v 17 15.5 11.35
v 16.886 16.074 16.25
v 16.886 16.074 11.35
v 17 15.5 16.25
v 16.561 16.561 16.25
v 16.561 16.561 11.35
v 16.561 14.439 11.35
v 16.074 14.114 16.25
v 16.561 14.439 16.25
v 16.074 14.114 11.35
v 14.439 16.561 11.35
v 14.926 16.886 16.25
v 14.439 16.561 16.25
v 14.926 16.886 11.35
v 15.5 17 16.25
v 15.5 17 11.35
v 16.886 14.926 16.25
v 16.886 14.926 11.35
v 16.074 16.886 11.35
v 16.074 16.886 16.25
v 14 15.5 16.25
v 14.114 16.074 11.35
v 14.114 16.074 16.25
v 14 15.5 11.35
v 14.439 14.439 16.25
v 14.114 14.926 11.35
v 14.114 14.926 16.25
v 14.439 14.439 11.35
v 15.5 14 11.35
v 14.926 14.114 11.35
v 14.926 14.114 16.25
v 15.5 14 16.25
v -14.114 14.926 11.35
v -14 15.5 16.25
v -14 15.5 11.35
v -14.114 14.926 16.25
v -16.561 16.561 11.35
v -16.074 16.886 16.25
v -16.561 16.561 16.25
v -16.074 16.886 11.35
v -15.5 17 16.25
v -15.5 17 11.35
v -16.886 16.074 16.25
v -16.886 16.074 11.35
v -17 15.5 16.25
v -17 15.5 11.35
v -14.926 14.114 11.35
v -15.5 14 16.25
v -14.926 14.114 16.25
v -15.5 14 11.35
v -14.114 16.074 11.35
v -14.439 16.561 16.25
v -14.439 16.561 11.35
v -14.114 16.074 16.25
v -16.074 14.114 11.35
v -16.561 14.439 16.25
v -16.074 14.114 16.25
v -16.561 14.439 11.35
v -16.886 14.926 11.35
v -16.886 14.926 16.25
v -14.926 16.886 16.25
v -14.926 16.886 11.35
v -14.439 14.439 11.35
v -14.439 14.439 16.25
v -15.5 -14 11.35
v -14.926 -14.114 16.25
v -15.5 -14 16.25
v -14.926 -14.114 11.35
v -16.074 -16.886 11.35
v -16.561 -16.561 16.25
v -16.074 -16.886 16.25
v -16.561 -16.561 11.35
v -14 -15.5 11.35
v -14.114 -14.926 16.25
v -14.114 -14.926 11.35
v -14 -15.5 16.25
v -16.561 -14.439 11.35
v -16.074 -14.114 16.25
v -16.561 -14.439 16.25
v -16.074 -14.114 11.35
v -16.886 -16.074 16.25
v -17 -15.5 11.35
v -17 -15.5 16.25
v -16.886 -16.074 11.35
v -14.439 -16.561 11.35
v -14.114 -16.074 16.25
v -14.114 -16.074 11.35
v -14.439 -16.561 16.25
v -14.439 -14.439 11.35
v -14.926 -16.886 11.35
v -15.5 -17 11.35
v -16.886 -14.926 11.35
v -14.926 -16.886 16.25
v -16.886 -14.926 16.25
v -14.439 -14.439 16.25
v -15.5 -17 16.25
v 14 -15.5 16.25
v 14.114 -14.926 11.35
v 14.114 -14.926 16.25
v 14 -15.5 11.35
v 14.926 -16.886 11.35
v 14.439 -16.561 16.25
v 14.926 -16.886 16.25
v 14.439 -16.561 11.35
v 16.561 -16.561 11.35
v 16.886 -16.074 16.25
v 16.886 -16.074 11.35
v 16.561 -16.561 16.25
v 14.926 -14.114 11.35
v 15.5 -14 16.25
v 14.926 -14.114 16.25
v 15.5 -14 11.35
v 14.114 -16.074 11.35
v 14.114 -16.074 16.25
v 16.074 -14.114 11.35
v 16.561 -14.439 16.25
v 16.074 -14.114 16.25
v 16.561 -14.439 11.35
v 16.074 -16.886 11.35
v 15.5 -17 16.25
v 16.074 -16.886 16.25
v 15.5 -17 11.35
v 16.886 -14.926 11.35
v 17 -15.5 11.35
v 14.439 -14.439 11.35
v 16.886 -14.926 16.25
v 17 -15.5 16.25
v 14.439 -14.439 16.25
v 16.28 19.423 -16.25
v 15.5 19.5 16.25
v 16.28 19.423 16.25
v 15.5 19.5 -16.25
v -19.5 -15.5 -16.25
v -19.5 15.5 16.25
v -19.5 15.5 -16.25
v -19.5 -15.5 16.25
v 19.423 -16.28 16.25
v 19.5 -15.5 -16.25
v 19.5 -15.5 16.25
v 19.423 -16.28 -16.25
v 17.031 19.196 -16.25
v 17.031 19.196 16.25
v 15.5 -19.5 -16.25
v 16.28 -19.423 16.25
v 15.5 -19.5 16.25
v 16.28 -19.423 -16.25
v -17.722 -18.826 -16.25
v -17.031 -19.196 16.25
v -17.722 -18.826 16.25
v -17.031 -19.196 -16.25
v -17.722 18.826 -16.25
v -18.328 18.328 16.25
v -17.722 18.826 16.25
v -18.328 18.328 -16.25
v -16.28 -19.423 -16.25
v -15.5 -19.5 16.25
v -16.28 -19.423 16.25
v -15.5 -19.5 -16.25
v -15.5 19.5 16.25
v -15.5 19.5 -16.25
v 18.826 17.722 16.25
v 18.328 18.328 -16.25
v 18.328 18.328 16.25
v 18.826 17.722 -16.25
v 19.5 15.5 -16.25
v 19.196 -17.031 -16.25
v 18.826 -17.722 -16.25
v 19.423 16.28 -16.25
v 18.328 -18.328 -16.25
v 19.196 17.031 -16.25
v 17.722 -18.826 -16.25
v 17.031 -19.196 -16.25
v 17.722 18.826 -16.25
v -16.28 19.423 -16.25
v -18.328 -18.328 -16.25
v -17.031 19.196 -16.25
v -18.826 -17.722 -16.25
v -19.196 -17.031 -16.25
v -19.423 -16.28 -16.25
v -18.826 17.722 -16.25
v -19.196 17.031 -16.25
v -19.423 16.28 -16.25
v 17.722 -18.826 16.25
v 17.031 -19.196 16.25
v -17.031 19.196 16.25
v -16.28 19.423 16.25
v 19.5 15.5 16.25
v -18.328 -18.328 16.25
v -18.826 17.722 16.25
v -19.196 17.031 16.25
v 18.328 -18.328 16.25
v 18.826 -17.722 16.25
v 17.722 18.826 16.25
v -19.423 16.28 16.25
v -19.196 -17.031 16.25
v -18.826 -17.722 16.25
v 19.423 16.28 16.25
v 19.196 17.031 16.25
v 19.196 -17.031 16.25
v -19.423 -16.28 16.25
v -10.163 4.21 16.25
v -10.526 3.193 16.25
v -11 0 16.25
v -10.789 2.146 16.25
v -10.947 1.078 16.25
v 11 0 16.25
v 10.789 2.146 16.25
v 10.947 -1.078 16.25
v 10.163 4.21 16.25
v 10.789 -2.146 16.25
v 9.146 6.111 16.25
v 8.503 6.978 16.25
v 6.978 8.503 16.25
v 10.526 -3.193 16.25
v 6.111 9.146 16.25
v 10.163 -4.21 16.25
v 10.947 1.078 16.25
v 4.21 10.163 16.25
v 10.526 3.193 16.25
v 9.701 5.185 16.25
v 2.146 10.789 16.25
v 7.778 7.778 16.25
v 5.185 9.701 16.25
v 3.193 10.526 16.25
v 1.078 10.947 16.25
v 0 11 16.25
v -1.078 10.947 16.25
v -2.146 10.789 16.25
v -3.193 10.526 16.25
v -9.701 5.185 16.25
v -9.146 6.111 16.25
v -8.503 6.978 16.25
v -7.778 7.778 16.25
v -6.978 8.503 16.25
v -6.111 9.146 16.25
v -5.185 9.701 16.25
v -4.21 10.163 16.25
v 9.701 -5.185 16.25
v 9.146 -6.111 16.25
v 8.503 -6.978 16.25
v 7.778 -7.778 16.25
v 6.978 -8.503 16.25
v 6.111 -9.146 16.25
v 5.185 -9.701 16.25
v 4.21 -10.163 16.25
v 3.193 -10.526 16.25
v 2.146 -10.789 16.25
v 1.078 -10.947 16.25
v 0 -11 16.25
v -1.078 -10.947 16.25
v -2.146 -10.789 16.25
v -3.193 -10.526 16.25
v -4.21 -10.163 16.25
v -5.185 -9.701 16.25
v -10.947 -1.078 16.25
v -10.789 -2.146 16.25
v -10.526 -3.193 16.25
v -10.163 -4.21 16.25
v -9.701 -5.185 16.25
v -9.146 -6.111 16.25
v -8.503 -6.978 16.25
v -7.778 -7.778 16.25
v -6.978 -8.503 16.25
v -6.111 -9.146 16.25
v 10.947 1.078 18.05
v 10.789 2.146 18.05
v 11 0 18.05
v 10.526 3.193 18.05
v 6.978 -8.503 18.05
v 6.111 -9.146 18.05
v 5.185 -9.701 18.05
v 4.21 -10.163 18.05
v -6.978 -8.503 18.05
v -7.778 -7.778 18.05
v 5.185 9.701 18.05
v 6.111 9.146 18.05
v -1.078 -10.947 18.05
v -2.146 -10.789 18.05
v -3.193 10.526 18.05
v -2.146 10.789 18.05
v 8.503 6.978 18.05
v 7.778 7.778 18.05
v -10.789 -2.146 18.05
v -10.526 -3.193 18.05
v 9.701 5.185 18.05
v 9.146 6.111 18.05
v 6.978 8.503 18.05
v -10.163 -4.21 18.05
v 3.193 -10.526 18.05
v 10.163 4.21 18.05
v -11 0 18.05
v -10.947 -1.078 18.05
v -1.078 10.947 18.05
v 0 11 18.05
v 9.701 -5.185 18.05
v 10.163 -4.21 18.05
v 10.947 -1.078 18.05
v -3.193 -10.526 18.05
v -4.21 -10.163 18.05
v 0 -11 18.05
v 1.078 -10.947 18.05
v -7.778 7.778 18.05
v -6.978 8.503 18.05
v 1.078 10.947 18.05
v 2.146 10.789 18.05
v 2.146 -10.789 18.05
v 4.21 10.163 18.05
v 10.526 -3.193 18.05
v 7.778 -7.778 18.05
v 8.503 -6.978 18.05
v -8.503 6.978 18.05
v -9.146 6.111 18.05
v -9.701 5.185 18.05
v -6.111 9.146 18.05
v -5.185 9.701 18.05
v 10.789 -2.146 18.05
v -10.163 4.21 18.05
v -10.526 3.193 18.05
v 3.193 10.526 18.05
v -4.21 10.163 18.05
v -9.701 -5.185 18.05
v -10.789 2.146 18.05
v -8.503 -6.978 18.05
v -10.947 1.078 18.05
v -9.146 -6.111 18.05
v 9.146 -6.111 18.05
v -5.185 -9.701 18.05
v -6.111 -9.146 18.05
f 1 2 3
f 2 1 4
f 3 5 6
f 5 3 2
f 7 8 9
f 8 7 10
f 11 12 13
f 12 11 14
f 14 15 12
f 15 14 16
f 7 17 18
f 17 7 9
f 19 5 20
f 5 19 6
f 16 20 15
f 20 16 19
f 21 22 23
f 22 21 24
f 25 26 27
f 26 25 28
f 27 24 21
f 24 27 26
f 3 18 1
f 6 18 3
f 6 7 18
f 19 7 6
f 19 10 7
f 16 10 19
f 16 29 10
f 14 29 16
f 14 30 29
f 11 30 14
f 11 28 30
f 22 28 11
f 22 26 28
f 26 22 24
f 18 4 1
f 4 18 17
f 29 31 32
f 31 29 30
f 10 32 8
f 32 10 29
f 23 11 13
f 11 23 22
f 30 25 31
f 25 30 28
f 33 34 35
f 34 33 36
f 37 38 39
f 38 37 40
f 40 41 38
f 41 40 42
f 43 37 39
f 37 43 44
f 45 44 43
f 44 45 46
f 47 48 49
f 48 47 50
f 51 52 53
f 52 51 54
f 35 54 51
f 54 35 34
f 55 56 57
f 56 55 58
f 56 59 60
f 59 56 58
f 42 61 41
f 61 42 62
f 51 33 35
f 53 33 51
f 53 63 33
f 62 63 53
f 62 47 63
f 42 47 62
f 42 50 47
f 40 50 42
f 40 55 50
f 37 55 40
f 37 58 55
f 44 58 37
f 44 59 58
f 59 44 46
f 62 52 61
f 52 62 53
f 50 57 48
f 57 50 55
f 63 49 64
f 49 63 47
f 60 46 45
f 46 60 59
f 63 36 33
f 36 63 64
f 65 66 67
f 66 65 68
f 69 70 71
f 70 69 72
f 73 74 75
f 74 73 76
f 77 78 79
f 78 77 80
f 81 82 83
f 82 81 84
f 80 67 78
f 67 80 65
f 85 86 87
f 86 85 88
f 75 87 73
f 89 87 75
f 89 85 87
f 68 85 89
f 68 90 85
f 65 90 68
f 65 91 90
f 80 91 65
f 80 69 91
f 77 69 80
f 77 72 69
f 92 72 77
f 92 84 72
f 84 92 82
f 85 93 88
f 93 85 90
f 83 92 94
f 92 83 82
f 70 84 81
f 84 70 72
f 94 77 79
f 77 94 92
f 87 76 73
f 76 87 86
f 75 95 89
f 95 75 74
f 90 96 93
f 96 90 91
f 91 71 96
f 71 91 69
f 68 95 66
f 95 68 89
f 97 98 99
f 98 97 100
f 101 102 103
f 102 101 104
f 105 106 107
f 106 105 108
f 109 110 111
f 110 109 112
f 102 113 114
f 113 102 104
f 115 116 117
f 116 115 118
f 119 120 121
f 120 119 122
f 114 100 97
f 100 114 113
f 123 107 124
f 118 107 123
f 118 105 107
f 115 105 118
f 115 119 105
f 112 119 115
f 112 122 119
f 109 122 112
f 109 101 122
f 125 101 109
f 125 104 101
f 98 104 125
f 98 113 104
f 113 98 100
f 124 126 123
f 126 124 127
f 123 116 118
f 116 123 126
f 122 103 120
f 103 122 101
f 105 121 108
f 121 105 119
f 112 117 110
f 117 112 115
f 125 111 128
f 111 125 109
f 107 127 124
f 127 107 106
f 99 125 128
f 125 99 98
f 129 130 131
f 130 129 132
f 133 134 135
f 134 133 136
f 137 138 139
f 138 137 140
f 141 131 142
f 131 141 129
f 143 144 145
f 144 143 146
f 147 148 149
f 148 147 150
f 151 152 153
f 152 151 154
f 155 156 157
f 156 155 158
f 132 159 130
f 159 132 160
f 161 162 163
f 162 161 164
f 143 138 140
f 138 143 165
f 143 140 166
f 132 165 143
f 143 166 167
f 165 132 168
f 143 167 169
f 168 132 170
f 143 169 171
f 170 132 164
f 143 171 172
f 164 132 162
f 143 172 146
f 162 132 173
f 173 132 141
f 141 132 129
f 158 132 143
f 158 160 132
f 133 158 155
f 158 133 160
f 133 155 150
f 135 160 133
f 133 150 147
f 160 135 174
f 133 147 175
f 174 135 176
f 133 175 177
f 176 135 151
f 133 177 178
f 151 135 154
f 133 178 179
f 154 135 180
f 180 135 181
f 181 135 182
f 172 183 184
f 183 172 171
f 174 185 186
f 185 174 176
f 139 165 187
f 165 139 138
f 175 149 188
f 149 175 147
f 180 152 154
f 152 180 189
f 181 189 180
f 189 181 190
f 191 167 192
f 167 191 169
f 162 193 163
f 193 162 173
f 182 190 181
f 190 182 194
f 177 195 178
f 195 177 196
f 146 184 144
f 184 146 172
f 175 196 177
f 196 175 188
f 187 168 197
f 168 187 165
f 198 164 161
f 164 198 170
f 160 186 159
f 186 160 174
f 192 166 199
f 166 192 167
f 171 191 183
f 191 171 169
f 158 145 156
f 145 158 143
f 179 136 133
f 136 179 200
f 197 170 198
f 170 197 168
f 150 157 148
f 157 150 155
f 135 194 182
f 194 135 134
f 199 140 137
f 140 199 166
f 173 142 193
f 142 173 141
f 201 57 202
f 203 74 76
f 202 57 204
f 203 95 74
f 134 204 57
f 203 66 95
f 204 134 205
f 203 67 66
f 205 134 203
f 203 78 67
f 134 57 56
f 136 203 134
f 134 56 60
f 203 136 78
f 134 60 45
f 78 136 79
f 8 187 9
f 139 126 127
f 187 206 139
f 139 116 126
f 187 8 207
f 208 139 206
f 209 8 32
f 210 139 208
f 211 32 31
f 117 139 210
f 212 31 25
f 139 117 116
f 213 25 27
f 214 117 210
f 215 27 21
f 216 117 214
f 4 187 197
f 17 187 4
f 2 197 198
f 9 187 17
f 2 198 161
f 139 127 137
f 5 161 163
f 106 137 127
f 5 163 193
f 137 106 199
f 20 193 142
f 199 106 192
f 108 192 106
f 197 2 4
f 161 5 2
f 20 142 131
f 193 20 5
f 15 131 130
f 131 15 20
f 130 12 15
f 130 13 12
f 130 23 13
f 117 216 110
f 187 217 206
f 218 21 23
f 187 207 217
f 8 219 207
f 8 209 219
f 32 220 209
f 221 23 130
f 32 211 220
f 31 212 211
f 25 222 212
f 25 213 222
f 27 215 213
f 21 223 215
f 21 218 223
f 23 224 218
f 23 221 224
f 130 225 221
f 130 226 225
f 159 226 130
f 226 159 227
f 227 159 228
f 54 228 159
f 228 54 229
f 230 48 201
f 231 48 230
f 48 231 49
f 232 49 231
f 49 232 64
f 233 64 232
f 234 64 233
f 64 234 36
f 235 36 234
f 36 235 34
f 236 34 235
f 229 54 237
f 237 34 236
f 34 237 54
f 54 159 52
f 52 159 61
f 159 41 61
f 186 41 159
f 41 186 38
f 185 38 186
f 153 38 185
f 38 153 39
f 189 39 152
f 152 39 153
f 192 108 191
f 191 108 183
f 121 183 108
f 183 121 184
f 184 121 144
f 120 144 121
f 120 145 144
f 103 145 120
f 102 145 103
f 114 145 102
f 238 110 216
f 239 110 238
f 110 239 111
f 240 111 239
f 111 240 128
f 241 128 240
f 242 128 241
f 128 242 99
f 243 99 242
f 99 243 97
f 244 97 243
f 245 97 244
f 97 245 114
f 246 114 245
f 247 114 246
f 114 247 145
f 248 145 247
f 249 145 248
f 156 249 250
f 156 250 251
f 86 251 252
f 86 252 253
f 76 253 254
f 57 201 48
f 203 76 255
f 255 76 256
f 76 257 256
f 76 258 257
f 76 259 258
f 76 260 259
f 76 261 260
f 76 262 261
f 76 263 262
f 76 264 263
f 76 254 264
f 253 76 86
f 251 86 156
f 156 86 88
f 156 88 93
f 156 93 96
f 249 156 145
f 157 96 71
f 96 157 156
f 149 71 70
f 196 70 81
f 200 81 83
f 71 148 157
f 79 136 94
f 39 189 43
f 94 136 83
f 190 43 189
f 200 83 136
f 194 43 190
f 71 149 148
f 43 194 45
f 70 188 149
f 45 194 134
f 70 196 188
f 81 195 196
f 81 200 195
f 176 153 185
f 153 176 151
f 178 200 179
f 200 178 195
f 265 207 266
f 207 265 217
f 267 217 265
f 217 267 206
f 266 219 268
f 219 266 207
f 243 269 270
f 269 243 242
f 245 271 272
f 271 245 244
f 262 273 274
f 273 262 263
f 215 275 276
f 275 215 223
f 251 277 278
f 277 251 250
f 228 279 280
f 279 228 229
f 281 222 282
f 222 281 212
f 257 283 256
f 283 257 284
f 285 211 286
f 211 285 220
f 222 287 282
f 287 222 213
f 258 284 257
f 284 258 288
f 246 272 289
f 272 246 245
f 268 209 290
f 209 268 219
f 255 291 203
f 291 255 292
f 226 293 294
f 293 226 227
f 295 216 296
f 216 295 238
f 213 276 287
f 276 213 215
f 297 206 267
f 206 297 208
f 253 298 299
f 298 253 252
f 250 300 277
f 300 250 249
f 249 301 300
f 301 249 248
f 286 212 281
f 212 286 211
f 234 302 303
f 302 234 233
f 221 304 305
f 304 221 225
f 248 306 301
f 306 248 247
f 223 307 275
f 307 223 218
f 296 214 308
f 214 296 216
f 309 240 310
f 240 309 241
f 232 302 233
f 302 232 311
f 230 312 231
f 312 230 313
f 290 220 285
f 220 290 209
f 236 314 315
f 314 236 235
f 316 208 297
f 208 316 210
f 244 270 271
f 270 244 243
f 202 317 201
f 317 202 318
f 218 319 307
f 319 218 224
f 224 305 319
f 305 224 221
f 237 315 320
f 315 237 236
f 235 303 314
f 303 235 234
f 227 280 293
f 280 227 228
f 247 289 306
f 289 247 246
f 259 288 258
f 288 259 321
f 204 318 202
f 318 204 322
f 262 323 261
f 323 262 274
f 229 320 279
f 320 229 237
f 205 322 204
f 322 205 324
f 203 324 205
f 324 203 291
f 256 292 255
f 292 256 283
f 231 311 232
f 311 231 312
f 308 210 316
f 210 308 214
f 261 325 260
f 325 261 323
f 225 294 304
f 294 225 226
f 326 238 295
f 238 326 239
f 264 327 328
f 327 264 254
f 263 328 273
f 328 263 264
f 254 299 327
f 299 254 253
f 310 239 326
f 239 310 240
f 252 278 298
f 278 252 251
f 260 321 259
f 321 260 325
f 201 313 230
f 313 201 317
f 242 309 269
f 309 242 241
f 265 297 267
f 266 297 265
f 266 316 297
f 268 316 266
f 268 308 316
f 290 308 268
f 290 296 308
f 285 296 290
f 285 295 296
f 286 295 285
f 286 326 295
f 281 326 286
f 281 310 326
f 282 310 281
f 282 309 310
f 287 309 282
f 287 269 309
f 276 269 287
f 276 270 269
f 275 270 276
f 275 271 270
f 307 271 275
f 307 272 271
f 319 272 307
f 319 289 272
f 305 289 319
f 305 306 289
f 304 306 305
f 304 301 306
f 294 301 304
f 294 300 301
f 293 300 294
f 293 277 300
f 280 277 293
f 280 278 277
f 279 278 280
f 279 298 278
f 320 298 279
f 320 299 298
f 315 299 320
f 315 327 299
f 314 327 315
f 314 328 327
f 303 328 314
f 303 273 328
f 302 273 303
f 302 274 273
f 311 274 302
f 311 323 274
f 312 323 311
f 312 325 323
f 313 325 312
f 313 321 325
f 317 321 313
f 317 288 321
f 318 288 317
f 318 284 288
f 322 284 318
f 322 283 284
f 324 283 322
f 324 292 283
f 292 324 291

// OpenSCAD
dscrw=31;
dwide=39;
lhigh=32.5;

module motor()
{
  dscrw=31;
  dwide=39;
  lhigh=32.5;
  dround=8;
  dcircle=22;
  hcircle=1.8;

  difference()
  {
  minkowski()
  {
    cube([dwide-dround,dwide-dround,lhigh/2],center=true);
    cylinder(d=dround,h=lhigh/2,center=true,$fn=32);
  }
    for(i=[0:3])
      rotate([0,0,i*90])
        translate([dscrw/2,dscrw/2,lhigh/2-4.9])
          cylinder(d=3,h=lhigh,$fn=16);
  }
  translate([0,0,lhigh/2])
    cylinder(d=dcircle,h=hcircle,$fn=64);
}

motor();
